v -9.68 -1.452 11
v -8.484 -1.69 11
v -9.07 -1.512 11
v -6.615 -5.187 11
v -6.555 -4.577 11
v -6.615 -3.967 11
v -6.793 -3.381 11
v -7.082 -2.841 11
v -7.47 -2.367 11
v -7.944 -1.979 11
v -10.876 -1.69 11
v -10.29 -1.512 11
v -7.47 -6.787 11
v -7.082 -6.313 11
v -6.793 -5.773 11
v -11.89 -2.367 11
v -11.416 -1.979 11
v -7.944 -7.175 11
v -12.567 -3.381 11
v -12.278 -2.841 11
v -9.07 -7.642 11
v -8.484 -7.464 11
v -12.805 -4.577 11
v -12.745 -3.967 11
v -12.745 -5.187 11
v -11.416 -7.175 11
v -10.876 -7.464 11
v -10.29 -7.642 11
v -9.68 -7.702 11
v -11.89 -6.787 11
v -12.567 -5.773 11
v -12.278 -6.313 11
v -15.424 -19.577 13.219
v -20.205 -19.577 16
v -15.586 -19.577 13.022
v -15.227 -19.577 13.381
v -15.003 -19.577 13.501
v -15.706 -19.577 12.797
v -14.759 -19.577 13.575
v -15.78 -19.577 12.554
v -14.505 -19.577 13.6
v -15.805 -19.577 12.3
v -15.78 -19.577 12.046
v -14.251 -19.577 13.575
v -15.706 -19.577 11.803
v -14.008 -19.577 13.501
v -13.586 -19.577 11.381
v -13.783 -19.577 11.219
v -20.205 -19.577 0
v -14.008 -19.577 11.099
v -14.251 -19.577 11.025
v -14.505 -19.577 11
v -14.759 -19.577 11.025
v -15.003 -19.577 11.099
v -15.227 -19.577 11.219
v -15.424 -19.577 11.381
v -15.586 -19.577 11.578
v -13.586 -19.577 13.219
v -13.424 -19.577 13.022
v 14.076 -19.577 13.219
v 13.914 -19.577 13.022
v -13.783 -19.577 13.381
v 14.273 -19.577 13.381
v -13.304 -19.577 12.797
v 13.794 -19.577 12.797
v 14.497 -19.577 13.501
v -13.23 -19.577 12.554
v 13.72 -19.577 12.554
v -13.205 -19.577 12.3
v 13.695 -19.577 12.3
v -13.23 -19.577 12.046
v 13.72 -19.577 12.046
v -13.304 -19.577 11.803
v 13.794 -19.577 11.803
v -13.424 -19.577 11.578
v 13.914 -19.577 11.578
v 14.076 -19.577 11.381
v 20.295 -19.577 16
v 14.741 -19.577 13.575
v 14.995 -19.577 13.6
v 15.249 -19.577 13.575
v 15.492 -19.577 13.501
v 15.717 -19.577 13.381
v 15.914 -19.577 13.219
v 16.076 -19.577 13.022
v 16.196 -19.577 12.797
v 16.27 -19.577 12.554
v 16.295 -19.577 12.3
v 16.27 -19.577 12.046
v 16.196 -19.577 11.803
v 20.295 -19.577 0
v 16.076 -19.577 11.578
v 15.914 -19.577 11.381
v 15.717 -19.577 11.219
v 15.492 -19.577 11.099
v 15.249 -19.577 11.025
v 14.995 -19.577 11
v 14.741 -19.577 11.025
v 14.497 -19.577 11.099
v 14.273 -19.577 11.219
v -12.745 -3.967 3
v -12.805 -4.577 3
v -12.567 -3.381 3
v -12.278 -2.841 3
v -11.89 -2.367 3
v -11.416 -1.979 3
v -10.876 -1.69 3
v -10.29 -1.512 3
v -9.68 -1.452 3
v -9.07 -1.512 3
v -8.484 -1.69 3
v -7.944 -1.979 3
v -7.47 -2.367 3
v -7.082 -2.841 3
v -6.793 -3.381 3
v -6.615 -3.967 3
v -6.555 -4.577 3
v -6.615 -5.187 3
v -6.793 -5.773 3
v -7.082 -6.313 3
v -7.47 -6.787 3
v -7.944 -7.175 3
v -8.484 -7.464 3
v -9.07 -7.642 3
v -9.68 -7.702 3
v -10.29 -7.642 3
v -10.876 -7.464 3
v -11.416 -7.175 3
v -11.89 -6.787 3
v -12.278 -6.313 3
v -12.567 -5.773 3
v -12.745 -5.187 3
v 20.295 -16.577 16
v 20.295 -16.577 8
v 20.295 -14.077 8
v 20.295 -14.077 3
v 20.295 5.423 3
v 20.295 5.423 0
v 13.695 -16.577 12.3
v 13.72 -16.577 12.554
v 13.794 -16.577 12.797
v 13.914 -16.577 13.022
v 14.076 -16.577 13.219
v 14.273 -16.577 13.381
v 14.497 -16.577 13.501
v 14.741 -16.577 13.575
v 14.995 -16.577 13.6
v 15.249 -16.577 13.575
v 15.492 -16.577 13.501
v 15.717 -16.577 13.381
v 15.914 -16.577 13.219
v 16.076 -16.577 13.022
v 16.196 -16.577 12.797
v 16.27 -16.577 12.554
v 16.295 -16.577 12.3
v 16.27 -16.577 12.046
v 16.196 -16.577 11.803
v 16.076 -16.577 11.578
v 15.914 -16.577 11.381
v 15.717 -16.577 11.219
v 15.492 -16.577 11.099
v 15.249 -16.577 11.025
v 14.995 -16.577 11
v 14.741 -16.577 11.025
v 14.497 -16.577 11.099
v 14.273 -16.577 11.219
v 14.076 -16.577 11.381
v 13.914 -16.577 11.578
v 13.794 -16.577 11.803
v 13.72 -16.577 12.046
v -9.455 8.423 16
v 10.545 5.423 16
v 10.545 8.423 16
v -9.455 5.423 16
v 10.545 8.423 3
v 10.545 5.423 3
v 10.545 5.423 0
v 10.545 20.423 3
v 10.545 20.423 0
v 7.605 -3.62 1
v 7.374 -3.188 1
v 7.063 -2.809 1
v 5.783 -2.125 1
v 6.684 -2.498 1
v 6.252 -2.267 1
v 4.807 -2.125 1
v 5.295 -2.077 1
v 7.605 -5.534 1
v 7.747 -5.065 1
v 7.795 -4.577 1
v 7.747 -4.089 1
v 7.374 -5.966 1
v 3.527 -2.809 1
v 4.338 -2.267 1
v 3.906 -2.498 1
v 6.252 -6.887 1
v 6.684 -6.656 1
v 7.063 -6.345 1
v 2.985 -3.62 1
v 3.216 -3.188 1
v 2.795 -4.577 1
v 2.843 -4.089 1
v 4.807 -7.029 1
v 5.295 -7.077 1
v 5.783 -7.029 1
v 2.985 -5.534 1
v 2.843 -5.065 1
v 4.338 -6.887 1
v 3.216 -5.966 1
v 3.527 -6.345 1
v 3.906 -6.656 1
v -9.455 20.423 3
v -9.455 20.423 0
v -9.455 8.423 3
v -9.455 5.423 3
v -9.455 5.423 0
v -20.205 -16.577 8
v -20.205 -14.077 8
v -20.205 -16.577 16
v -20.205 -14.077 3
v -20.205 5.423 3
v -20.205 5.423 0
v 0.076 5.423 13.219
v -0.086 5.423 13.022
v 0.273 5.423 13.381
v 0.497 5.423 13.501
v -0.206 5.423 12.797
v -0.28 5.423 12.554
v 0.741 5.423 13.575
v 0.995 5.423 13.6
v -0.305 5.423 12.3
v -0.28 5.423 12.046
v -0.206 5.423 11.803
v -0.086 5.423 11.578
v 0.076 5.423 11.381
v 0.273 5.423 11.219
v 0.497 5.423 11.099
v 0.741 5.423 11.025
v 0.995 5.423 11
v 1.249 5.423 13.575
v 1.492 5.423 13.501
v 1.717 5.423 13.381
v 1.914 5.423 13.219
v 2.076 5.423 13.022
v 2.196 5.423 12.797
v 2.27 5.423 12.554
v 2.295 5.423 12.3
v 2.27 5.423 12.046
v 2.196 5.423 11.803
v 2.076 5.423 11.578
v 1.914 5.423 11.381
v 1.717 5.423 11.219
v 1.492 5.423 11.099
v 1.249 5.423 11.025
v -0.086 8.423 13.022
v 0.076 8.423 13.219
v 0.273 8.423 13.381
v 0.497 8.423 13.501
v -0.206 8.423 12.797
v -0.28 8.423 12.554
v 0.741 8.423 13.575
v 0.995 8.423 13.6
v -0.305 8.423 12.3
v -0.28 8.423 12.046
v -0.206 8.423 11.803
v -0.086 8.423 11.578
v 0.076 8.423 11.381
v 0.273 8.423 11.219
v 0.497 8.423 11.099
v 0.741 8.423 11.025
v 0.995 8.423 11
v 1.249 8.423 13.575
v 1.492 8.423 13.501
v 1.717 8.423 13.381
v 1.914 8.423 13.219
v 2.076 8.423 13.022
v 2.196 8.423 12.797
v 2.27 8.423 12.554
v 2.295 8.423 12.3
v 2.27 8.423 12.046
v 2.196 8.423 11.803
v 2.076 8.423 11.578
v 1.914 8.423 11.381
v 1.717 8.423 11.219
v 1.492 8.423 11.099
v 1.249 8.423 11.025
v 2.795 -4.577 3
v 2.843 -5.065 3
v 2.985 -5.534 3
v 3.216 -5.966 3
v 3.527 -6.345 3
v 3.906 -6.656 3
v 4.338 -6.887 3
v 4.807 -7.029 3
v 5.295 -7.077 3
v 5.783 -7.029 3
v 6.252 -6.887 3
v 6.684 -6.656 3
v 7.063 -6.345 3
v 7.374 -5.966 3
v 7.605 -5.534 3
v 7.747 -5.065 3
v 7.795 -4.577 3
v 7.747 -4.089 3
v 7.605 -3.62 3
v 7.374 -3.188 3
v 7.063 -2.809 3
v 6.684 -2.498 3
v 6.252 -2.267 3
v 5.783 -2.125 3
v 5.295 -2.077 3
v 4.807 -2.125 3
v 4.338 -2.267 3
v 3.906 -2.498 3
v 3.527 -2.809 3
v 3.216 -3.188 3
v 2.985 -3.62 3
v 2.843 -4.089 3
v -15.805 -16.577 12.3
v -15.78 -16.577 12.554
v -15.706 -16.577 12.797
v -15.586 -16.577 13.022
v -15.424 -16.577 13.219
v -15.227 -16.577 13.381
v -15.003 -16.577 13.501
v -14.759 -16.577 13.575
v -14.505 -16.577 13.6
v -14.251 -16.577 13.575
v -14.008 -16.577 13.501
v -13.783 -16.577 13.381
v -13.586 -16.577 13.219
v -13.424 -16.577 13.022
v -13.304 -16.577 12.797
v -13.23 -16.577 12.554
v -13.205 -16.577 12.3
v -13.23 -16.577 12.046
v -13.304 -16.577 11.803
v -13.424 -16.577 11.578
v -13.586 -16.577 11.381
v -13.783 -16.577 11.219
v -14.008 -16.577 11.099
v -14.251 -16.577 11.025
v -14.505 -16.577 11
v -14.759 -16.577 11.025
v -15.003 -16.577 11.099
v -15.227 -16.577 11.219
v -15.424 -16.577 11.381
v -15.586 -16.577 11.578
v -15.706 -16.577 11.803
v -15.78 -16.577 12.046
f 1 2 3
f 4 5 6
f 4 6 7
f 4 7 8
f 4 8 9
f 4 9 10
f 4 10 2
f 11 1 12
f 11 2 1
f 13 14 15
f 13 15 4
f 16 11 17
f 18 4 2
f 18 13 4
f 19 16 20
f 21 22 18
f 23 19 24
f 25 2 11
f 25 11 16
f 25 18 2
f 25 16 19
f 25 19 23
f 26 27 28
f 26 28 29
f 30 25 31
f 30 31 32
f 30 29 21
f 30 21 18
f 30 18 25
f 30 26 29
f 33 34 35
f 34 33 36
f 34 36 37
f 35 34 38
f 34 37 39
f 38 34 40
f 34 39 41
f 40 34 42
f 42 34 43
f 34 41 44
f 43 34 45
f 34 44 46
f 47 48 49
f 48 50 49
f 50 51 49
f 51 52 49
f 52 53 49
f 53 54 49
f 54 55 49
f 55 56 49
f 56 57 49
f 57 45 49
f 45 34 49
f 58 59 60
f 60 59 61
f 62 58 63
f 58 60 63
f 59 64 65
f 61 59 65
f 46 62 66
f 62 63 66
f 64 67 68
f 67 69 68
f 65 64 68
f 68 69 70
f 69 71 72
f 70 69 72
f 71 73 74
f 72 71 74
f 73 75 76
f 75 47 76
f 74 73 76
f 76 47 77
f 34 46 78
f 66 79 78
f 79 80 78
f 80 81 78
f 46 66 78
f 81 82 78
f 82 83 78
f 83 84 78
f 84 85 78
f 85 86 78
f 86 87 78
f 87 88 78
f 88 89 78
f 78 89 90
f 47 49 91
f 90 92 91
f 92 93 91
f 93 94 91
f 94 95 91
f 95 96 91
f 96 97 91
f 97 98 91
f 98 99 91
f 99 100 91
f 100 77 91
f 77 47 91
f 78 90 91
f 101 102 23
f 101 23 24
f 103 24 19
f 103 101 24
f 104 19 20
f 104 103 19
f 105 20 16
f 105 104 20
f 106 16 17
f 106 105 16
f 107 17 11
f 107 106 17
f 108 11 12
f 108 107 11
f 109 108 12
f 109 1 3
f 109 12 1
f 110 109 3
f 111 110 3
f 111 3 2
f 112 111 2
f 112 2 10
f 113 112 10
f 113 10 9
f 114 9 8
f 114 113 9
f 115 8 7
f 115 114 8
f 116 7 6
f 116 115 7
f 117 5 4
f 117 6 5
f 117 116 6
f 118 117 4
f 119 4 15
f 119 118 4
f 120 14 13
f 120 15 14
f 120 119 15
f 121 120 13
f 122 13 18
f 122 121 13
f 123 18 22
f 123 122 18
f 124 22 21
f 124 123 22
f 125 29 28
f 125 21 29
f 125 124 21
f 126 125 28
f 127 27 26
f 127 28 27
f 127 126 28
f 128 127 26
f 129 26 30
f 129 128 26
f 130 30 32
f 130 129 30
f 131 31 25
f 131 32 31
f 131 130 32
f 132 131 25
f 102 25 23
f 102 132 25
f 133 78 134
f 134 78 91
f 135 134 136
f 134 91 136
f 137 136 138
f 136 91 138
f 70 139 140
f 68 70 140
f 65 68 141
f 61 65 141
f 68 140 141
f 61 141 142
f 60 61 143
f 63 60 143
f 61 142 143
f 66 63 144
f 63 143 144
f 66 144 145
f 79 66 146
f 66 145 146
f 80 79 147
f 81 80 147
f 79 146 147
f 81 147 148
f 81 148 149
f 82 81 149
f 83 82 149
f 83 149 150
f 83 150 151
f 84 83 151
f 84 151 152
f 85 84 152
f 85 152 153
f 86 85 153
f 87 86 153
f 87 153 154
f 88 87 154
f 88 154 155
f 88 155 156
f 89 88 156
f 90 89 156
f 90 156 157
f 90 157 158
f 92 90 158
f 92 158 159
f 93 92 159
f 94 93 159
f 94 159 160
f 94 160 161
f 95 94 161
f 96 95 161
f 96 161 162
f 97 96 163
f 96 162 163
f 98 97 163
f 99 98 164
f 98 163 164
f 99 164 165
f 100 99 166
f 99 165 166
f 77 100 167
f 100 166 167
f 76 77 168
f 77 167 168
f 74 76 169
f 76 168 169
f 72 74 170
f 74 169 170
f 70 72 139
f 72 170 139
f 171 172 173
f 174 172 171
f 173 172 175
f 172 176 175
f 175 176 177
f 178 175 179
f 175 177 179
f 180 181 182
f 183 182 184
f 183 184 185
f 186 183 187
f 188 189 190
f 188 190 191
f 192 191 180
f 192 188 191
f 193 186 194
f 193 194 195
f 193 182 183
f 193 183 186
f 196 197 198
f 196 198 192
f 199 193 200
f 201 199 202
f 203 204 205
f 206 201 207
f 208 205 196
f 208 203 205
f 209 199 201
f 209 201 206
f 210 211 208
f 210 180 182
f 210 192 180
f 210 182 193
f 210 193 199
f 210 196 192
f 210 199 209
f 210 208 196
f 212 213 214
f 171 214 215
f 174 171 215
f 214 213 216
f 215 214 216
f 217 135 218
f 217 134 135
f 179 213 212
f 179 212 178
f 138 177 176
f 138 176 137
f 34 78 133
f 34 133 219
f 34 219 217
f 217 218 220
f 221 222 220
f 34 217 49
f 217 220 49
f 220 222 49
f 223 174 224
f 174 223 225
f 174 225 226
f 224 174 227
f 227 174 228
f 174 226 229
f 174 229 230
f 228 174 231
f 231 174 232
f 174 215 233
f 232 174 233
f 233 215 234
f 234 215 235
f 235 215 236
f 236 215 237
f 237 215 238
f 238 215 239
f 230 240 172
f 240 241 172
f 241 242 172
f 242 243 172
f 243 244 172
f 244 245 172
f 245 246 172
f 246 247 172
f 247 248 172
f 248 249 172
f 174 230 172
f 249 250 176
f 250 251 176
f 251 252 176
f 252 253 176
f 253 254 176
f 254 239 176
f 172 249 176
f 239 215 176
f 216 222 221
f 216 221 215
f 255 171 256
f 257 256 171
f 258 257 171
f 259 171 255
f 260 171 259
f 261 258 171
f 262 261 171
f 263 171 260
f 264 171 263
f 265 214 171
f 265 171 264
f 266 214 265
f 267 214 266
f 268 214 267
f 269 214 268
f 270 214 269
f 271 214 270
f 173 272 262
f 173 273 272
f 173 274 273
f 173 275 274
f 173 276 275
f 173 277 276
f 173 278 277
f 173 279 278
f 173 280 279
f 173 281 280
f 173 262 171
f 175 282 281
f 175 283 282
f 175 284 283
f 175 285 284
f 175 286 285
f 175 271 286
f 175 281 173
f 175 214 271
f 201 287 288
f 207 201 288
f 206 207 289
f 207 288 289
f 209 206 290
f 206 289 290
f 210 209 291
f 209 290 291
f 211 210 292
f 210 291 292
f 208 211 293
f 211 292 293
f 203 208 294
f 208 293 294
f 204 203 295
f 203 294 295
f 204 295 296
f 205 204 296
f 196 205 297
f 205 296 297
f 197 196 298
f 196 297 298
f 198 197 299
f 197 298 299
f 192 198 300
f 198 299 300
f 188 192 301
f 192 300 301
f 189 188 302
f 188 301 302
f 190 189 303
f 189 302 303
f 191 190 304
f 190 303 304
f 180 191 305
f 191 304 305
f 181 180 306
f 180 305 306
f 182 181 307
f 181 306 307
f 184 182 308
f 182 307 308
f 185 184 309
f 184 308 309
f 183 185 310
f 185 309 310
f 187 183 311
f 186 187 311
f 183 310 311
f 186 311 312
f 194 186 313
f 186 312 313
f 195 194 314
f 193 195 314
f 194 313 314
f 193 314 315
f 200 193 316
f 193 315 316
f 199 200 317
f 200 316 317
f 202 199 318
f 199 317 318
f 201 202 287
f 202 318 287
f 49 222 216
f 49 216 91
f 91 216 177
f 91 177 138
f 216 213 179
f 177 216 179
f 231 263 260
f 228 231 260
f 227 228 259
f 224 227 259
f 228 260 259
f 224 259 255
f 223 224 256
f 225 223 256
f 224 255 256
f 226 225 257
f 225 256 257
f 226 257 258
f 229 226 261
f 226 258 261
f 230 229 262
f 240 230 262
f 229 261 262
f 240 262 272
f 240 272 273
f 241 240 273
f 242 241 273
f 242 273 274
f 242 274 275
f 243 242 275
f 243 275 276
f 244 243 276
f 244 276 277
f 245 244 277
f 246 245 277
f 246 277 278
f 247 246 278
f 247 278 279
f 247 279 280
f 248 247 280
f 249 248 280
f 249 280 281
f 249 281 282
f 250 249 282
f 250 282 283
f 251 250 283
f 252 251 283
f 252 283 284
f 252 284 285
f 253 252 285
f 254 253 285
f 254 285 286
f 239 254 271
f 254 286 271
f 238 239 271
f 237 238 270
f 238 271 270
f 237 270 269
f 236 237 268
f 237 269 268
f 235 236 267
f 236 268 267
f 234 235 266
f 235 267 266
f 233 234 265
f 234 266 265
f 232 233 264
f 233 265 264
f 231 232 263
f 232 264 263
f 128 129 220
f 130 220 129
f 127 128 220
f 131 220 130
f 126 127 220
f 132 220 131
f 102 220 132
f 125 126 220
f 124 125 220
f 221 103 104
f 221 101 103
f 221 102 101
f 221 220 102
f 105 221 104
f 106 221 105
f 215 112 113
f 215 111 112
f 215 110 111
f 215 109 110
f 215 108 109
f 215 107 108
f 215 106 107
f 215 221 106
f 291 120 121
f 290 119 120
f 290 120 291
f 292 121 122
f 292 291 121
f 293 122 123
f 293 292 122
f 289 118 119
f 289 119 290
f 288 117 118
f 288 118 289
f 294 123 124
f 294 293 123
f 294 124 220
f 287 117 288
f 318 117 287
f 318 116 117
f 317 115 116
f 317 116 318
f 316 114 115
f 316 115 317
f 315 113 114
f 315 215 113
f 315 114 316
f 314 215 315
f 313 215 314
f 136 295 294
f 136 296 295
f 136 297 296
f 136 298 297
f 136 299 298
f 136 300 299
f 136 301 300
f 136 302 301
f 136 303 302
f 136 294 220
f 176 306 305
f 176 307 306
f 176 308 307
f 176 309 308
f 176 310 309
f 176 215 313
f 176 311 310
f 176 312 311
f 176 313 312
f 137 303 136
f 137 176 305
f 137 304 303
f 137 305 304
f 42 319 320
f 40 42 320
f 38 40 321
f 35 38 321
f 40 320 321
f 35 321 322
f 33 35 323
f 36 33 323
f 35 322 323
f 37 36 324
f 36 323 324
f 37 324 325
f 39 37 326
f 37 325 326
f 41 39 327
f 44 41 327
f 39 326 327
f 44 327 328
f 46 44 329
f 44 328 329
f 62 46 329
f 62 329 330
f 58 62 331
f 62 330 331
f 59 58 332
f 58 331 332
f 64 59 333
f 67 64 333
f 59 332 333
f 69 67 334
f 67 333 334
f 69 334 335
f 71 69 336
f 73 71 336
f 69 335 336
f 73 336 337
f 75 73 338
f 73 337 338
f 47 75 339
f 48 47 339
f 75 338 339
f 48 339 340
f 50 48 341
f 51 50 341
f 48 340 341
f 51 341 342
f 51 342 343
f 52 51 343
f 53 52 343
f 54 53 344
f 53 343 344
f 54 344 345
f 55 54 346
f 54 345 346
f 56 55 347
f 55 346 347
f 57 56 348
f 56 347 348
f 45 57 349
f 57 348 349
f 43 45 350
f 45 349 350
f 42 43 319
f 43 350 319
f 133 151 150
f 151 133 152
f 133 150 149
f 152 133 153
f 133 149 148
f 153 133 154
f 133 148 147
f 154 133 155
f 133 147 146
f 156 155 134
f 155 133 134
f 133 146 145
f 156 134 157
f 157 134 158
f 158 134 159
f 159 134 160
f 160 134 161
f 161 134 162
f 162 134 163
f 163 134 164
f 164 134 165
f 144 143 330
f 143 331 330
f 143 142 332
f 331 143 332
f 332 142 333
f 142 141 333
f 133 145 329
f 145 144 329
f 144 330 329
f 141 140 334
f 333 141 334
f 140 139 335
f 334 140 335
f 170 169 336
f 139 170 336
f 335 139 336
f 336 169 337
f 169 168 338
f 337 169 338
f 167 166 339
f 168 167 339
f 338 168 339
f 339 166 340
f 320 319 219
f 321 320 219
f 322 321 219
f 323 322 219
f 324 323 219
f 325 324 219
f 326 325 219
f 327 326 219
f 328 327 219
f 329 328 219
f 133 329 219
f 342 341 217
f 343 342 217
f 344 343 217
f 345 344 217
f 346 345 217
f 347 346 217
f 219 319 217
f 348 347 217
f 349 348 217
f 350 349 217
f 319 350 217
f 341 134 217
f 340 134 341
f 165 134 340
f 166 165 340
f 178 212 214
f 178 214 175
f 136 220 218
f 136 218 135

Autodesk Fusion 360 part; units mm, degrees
sketch "Base" plane through (0, 0, 0) normal (0, 0, 1) x (1, 0, 0)
  line L0 (-9.4551, 20.4231) -> (10.5449, 20.4231)
  line L1 (20.2949, 5.4231) -> (20.2949, -19.5769)
  line L2 (20.2949, -19.5769) -> (-20.2051, -19.5769)
  line L3 (-20.2051, -19.5769) -> (-20.2051, 5.4231)
  line L4 (-20.2051, 5.4231) -> (-9.4551, 5.4231)
  line L5 (-9.4551, 5.4231) -> (-9.4551, 20.4231)
  line L6 (10.5449, 20.4231) -> (10.5449, 5.4231)
  line L7 (10.5449, 5.4231) -> (20.2949, 5.4231)
  dimension "d1" = 40
  dimension "d2" = 40.5
  dimension "d3" = 25
  dimension "d4" = 25
  dimension "d5" = 10.75
  dimension "d6" = 20
extrude "Extrude1" add sketch "Base" along normal blind 3
sketch "Messurements" plane through (0, 0, 3) normal (0, 0, 1) x (-1, 0, 0)
  line L0 (-10.5449, -5.4231) -> (-10.5449, -20.4231)
  line L1 (-10.5449, -20.4231) -> (9.4551, -20.4231)
  line L2 (9.4551, -20.4231) -> (9.4551, -5.4231)
  line L3 (9.4551, -5.4231) -> (20.2051, -5.4231)
  line L4 (20.2051, -5.4231) -> (20.2051, 19.5769)
  line L5 (20.2051, 19.5769) -> (-20.2949, 19.5769)
  line L6 (-20.2949, 19.5769) -> (-20.2949, -5.4231)
  line L7 (-20.2949, -5.4231) -> (-10.5449, -5.4231)
  line L8 (20.2051, 14.0769) -> (-20.2949, 14.0769)
  line L9 (9.4551, -5.4231) -> (-10.5449, -5.4231)
  line L10 (9.4551, -8.4231) -> (-10.5449, -8.4231)
  circle A0 centre (-5.2949, 4.5769) radius 2.5
  circle A1 centre (9.6801, 4.5769) radius 3.125
  dimension "d9" = 5.5
  dimension "d10" = 3
  dimension "d11" = 5
  dimension "d12" = 6.25
  dimension "d13" = 15
  dimension "d14" = 10
  dimension "d15" = 10
  dimension "d16" = 10.525
extrude "Extrude2" cut sketch "Messurements" against normal blind 2 contours A0
extrude "Extrude3" add sketch "Messurements" along normal blind 8 contours A1
extrude "Extrude4" add sketch "Messurements" along normal blind 5 contours L4 L5 L6 L8
extrude "Extrude5" add sketch "Messurements" along normal blind 13 contours L0 L2 L9 L10
sketch "Other" plane through (0, 0, 8) normal (0, 0, 1) x (-1, 0, 0)
  line L0 (20.2051, 19.5769) -> (-20.2949, 19.5769)
  line L1 (-20.2949, 19.5769) -> (-20.2949, 14.0769)
  line L2 (-20.2949, 14.0769) -> (20.2051, 14.0769)
  line L3 (20.2051, 14.0769) -> (20.2051, 19.5769)
  line L4 (20.2051, 14.0769) -> (-20.2949, 14.0769)
  line L5 (-20.2949, 16.5769) -> (20.2051, 16.5769)
  dimension "d28" = 2.5
extrude "Extrude6" add sketch "Other" along normal blind 8 contours L0 L1 L3 L5
sketch "Attachment2" plane through (0, -16.5769, 0) normal (0, 1, 0) x (-1, 0, 0)
  line L0 (-20.2949, 8) -> (20.2051, 8)
  line L1 (20.2051, 8) -> (20.2051, 16)
  line L2 (20.2051, 16) -> (-20.2949, 16)
  line L3 (-20.2949, 16) -> (-20.2949, 8)
  circle A0 centre (-14.9949, 12.3) radius 1.3
  circle A1 centre (14.5051, 12.3) radius 1.3
  dimension "d31" = 2.6
  dimension "d32" = 3.7
  dimension "d33" = 5.3
  dimension "d34" = 2.6
  dimension "d35" = 5.7
  dimension "d36" = 3.7
extrude "Extrude7" cut sketch "Attachment2" against normal through all contours A0
extrude "Extrude8" cut sketch "Attachment2" against normal through all contours A1
sketch "Attachment" plane through (0, 8.4231, 0) normal (0, 1, 0) x (-1, 0, 0)
  line L0 (-10.5449, 3) -> (9.4551, 3)
  line L1 (9.4551, 3) -> (9.4551, 16)
  line L2 (9.4551, 16) -> (-10.5449, 16)
  line L3 (-10.5449, 16) -> (-10.5449, 3)
  circle A0 centre (-0.9949, 12.3) radius 1.3
  dimension "d39" = 2.6
  dimension "d40" = 3.7
  dimension "d41" = 9.55
extrude "Extrude9" cut sketch "Attachment" against normal blind 4 contours A0
